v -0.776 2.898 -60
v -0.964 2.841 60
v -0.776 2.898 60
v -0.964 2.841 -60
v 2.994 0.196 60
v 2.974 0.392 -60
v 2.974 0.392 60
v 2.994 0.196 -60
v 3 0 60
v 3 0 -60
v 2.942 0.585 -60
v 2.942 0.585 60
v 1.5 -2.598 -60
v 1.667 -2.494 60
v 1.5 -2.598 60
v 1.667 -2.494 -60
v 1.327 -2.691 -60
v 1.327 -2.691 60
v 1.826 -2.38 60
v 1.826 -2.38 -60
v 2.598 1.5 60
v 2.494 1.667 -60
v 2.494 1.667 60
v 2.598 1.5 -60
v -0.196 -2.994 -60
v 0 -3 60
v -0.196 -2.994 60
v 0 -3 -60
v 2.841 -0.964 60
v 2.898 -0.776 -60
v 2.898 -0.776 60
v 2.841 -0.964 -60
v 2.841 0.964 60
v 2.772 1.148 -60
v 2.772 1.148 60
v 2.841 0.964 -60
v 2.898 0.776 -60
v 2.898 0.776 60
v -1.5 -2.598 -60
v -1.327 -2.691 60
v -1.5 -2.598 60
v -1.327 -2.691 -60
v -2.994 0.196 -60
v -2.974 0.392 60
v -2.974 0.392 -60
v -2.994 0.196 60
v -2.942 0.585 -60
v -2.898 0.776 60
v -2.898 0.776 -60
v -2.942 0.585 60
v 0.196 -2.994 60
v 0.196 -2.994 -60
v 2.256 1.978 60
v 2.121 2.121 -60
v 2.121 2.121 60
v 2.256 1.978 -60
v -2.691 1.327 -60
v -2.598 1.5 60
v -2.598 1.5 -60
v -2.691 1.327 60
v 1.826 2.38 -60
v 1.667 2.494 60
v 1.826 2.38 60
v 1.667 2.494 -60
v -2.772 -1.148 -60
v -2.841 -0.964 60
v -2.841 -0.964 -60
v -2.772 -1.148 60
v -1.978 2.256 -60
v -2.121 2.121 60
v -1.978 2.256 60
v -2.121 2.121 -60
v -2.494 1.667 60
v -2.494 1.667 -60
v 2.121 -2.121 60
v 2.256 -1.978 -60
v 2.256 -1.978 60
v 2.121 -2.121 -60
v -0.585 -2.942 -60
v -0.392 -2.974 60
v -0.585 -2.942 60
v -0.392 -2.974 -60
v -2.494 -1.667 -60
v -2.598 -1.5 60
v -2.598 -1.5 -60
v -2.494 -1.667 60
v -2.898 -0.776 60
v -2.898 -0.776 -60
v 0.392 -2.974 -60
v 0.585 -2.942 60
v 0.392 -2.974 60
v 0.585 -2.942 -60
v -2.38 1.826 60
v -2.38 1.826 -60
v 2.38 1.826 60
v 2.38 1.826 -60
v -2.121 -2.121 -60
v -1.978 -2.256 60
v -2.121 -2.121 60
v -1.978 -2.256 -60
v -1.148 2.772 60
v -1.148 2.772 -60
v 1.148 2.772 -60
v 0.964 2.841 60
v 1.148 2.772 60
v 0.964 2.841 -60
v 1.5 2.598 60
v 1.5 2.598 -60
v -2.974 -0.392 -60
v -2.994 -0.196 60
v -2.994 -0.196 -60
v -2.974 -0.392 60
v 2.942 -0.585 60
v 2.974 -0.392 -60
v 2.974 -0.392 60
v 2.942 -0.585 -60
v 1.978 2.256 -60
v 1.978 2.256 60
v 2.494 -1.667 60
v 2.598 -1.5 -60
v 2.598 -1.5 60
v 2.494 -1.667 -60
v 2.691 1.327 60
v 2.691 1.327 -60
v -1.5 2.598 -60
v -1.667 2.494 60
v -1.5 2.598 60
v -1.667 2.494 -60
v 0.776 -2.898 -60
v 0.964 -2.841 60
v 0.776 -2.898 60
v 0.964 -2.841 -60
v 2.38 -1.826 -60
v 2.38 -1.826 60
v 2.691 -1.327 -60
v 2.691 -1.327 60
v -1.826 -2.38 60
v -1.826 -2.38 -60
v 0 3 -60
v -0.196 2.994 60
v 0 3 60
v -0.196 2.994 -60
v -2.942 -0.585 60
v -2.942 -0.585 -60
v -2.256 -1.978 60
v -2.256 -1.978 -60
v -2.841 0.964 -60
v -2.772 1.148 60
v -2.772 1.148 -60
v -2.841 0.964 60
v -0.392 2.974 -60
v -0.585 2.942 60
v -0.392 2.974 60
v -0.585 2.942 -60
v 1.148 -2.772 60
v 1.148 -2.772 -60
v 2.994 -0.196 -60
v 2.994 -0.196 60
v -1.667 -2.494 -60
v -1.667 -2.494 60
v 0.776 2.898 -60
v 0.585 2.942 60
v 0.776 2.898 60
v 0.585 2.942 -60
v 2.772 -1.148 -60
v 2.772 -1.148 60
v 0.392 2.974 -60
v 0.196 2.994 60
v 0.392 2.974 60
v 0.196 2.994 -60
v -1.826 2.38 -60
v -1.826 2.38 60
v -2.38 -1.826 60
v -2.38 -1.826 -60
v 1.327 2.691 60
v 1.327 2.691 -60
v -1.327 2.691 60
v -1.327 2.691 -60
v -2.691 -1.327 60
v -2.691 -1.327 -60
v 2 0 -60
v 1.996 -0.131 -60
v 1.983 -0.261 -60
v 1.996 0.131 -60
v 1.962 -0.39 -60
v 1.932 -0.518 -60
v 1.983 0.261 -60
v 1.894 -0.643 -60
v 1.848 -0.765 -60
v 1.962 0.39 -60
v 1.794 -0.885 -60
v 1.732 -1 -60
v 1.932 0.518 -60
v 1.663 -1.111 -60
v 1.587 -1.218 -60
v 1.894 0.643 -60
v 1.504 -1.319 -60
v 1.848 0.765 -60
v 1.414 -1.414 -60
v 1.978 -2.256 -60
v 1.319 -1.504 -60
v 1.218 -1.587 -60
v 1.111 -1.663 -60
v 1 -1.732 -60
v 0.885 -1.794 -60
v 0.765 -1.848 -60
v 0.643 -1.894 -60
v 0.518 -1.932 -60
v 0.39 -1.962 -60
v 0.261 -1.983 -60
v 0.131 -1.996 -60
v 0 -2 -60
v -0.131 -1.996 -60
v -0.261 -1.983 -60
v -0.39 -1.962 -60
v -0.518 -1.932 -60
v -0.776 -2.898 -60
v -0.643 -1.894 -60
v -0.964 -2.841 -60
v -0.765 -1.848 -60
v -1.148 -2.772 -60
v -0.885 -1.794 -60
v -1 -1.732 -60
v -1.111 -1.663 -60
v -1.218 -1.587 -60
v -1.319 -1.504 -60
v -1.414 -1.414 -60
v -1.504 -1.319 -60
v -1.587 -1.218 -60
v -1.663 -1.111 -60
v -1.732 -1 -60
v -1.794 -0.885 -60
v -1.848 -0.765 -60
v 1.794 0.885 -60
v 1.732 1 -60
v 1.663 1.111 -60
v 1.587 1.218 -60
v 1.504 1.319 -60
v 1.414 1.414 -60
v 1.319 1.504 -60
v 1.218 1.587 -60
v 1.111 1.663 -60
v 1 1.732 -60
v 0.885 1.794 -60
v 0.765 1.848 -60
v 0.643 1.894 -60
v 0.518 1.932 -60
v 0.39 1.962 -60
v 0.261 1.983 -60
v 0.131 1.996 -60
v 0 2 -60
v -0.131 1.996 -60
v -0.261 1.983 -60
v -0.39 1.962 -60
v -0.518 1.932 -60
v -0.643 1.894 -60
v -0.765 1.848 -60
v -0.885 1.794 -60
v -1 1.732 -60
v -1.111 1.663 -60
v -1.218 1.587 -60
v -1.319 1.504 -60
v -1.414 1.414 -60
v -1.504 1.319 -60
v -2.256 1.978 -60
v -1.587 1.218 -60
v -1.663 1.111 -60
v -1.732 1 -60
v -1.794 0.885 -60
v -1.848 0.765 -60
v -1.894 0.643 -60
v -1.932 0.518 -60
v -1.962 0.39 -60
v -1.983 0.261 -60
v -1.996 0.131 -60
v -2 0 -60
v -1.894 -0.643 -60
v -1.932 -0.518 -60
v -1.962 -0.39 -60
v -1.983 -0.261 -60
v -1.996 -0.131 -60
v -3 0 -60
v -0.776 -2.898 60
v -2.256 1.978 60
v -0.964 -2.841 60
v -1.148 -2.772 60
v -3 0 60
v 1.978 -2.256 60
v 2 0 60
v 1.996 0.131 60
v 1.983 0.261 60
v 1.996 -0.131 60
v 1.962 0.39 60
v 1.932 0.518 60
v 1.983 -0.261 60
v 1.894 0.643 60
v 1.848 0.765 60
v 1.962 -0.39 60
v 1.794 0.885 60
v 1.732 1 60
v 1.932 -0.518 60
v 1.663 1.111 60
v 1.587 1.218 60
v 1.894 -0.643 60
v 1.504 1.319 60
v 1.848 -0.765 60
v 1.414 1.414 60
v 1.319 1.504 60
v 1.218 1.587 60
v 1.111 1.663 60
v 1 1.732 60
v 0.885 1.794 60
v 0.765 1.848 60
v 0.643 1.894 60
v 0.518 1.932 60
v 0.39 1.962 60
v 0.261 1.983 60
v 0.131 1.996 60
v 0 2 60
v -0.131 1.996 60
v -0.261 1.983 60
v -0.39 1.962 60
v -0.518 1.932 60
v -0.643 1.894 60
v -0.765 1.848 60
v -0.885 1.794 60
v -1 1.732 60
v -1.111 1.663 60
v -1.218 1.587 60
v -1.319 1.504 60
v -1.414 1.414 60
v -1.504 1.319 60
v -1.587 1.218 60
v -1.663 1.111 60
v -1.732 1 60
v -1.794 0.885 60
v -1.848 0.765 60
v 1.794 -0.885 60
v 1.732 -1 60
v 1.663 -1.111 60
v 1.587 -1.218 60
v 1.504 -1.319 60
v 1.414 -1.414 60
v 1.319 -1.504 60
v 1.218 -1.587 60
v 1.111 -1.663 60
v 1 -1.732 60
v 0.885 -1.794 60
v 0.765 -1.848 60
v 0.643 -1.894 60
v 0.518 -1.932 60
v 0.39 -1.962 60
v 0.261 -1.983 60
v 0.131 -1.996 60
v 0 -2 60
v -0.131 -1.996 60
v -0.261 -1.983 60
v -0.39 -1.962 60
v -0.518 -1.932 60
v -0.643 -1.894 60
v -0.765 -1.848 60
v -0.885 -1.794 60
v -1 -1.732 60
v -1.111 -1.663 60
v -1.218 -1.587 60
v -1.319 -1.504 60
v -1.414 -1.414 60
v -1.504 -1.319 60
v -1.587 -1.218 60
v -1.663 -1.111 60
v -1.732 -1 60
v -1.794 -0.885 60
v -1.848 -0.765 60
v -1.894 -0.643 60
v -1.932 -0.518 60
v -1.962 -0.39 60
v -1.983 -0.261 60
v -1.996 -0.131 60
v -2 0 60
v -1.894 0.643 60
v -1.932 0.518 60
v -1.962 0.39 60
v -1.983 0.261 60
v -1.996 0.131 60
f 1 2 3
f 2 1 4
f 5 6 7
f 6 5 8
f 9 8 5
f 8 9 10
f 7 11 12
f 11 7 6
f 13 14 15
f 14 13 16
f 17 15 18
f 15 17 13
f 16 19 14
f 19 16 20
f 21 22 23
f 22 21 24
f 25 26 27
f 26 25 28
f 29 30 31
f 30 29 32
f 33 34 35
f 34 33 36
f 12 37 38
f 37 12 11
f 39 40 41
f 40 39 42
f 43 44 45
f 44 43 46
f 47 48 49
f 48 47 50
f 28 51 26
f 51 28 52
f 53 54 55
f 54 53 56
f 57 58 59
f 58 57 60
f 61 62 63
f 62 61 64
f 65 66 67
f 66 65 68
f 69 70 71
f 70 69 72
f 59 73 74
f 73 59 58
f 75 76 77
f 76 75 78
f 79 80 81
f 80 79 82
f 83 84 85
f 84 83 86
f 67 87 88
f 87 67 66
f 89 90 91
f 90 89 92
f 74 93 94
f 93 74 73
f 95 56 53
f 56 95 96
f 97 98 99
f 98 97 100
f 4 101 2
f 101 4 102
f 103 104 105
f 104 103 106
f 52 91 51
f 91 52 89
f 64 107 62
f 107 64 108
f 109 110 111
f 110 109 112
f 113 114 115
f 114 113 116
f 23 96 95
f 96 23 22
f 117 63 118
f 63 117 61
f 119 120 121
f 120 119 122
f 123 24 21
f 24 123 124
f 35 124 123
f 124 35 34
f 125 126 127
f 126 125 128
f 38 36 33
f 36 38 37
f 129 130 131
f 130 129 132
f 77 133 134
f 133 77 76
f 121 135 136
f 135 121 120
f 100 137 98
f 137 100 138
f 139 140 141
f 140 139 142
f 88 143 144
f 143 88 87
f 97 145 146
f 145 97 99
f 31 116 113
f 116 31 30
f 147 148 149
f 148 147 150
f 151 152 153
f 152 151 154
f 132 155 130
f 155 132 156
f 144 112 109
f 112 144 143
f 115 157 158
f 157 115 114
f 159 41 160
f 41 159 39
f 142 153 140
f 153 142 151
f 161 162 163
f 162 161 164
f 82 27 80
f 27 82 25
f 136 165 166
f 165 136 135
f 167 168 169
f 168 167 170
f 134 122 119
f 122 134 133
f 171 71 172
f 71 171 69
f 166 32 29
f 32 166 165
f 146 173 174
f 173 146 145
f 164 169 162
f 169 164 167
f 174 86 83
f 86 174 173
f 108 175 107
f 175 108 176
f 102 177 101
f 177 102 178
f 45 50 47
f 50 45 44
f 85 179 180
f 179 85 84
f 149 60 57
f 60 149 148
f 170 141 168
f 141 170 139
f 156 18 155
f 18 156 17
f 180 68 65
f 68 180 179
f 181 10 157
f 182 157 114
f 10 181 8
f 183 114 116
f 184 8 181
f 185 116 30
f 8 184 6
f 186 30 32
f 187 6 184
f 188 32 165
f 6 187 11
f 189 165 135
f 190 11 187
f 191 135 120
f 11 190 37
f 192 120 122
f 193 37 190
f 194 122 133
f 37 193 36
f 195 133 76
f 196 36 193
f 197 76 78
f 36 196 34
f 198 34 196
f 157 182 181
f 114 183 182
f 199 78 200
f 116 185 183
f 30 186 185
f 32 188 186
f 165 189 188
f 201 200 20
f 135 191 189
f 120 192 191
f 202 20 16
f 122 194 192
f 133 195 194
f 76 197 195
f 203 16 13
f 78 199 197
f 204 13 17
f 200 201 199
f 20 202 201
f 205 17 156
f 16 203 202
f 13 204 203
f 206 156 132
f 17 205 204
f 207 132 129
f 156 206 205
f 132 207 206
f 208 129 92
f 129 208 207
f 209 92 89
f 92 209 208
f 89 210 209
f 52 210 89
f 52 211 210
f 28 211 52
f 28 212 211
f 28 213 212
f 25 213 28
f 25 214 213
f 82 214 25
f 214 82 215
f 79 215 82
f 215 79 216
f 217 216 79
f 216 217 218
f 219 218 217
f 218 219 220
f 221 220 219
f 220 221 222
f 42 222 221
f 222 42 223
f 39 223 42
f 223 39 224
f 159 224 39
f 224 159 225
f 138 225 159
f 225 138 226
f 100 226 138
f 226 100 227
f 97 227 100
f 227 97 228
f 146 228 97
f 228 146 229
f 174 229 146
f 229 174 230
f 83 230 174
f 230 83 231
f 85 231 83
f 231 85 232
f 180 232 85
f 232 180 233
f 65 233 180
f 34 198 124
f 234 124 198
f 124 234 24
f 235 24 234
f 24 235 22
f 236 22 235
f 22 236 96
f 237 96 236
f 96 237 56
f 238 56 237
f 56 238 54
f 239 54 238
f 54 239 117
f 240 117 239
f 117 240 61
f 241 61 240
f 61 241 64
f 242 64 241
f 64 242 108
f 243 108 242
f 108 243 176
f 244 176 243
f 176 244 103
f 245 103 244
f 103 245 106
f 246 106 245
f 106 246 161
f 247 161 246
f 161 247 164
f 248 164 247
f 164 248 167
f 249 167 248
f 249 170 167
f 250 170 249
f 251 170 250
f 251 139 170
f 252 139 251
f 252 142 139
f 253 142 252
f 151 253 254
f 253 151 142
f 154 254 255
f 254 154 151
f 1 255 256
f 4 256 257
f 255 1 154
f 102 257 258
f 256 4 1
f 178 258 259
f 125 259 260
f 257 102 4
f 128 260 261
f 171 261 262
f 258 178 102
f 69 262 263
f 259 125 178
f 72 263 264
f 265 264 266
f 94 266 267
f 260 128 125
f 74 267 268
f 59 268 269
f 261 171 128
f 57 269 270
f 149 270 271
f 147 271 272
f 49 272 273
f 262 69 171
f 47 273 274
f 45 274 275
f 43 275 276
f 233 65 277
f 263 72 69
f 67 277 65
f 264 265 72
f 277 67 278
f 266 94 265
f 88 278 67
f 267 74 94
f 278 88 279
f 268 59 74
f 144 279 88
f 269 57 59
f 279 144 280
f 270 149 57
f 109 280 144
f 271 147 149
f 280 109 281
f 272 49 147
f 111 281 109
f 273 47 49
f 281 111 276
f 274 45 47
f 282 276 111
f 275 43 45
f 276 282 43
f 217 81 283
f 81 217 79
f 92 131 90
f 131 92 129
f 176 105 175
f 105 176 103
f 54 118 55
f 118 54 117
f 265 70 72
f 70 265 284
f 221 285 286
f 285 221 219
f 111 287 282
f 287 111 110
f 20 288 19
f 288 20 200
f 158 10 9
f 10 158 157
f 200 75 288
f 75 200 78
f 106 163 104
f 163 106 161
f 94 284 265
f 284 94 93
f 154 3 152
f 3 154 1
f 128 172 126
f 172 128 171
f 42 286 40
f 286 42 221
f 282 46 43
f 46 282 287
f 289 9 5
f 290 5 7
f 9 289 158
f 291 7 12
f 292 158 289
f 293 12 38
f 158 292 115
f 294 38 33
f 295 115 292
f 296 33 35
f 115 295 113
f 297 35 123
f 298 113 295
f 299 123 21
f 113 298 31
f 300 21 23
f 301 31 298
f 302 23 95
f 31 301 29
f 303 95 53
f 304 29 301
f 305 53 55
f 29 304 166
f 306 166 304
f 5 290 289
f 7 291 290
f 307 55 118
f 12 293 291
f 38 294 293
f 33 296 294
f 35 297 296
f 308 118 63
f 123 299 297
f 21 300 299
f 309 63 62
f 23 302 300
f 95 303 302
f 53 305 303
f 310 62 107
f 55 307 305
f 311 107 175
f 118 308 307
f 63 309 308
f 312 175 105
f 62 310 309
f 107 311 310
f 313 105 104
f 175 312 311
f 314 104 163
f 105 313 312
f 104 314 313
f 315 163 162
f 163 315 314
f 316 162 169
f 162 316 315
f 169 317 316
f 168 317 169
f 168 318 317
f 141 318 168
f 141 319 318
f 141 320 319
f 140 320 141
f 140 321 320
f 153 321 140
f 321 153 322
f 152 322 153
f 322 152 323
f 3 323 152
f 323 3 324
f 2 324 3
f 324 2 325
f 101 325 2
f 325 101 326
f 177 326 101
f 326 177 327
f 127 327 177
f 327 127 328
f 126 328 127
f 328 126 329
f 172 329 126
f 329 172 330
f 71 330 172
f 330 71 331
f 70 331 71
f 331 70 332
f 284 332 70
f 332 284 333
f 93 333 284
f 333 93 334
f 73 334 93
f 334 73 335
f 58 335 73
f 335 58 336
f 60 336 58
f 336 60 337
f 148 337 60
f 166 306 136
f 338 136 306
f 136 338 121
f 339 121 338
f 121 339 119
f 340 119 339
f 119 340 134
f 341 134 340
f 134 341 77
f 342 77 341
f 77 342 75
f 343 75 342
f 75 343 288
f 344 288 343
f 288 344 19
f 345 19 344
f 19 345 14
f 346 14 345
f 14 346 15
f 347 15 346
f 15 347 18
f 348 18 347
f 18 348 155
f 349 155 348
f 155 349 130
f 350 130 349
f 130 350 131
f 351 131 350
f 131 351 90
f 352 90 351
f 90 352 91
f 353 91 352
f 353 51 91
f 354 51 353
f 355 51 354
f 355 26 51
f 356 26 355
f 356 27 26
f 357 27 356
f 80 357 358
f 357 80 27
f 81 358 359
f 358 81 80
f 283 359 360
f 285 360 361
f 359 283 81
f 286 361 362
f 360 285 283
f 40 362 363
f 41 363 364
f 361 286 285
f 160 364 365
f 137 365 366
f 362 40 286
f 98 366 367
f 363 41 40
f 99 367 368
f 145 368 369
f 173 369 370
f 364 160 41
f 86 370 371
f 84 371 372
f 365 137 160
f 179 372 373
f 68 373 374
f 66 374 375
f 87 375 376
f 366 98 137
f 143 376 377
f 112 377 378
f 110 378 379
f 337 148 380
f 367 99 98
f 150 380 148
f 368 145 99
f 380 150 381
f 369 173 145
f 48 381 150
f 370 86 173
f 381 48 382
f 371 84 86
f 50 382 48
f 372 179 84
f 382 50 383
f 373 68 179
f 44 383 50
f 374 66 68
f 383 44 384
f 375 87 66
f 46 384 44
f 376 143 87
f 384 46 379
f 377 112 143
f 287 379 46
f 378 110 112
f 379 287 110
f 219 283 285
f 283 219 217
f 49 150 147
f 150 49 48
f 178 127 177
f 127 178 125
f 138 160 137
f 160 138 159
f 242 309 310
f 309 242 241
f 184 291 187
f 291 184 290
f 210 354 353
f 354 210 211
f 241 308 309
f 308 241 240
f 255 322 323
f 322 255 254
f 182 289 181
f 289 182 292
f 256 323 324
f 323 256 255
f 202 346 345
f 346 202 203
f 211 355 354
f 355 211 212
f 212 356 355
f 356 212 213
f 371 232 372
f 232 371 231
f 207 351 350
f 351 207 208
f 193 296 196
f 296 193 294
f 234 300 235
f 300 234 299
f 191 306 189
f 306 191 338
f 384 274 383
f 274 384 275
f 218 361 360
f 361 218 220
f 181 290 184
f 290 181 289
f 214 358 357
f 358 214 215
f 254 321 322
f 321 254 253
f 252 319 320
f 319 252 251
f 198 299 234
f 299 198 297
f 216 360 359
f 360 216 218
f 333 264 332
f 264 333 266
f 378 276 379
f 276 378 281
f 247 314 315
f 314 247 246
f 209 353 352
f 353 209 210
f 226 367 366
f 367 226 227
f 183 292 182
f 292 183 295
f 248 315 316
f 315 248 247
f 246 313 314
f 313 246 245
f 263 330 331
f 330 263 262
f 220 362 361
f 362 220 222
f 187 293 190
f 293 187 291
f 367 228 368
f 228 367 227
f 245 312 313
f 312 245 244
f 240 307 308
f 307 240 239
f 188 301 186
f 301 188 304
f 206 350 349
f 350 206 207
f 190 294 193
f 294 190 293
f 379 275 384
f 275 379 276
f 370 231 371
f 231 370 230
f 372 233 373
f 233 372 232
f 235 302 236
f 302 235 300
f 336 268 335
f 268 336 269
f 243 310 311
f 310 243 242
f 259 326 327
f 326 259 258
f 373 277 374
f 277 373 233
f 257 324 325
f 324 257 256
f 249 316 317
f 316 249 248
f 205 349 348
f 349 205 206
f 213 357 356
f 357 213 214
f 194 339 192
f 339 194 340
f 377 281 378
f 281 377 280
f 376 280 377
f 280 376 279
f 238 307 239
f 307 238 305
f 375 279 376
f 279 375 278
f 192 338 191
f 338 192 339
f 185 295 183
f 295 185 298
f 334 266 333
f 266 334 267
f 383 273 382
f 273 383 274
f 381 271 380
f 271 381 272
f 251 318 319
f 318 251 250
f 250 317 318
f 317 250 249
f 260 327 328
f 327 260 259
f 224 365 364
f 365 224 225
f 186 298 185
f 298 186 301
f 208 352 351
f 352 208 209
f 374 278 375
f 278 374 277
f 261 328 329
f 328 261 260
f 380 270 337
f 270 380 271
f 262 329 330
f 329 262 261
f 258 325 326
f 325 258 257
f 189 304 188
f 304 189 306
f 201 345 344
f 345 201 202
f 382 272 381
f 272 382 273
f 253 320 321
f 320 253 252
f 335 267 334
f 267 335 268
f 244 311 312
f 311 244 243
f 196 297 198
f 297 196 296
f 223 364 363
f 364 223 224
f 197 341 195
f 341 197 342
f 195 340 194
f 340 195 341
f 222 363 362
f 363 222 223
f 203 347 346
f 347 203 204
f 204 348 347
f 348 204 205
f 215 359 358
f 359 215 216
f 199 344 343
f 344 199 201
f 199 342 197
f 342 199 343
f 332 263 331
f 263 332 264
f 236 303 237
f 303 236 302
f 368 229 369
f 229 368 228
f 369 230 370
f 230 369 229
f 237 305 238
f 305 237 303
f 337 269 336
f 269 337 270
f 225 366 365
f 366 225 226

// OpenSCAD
$fn=96;

module ptfe_sleeving(length=100, od=6, id=4) {
    difference() {
        cylinder(h=length, d=od, center=true);
        cylinder(h=length+0.2, d=id, center=true);
    }
}

ptfe_sleeving(length=120, od=6, id=4);
